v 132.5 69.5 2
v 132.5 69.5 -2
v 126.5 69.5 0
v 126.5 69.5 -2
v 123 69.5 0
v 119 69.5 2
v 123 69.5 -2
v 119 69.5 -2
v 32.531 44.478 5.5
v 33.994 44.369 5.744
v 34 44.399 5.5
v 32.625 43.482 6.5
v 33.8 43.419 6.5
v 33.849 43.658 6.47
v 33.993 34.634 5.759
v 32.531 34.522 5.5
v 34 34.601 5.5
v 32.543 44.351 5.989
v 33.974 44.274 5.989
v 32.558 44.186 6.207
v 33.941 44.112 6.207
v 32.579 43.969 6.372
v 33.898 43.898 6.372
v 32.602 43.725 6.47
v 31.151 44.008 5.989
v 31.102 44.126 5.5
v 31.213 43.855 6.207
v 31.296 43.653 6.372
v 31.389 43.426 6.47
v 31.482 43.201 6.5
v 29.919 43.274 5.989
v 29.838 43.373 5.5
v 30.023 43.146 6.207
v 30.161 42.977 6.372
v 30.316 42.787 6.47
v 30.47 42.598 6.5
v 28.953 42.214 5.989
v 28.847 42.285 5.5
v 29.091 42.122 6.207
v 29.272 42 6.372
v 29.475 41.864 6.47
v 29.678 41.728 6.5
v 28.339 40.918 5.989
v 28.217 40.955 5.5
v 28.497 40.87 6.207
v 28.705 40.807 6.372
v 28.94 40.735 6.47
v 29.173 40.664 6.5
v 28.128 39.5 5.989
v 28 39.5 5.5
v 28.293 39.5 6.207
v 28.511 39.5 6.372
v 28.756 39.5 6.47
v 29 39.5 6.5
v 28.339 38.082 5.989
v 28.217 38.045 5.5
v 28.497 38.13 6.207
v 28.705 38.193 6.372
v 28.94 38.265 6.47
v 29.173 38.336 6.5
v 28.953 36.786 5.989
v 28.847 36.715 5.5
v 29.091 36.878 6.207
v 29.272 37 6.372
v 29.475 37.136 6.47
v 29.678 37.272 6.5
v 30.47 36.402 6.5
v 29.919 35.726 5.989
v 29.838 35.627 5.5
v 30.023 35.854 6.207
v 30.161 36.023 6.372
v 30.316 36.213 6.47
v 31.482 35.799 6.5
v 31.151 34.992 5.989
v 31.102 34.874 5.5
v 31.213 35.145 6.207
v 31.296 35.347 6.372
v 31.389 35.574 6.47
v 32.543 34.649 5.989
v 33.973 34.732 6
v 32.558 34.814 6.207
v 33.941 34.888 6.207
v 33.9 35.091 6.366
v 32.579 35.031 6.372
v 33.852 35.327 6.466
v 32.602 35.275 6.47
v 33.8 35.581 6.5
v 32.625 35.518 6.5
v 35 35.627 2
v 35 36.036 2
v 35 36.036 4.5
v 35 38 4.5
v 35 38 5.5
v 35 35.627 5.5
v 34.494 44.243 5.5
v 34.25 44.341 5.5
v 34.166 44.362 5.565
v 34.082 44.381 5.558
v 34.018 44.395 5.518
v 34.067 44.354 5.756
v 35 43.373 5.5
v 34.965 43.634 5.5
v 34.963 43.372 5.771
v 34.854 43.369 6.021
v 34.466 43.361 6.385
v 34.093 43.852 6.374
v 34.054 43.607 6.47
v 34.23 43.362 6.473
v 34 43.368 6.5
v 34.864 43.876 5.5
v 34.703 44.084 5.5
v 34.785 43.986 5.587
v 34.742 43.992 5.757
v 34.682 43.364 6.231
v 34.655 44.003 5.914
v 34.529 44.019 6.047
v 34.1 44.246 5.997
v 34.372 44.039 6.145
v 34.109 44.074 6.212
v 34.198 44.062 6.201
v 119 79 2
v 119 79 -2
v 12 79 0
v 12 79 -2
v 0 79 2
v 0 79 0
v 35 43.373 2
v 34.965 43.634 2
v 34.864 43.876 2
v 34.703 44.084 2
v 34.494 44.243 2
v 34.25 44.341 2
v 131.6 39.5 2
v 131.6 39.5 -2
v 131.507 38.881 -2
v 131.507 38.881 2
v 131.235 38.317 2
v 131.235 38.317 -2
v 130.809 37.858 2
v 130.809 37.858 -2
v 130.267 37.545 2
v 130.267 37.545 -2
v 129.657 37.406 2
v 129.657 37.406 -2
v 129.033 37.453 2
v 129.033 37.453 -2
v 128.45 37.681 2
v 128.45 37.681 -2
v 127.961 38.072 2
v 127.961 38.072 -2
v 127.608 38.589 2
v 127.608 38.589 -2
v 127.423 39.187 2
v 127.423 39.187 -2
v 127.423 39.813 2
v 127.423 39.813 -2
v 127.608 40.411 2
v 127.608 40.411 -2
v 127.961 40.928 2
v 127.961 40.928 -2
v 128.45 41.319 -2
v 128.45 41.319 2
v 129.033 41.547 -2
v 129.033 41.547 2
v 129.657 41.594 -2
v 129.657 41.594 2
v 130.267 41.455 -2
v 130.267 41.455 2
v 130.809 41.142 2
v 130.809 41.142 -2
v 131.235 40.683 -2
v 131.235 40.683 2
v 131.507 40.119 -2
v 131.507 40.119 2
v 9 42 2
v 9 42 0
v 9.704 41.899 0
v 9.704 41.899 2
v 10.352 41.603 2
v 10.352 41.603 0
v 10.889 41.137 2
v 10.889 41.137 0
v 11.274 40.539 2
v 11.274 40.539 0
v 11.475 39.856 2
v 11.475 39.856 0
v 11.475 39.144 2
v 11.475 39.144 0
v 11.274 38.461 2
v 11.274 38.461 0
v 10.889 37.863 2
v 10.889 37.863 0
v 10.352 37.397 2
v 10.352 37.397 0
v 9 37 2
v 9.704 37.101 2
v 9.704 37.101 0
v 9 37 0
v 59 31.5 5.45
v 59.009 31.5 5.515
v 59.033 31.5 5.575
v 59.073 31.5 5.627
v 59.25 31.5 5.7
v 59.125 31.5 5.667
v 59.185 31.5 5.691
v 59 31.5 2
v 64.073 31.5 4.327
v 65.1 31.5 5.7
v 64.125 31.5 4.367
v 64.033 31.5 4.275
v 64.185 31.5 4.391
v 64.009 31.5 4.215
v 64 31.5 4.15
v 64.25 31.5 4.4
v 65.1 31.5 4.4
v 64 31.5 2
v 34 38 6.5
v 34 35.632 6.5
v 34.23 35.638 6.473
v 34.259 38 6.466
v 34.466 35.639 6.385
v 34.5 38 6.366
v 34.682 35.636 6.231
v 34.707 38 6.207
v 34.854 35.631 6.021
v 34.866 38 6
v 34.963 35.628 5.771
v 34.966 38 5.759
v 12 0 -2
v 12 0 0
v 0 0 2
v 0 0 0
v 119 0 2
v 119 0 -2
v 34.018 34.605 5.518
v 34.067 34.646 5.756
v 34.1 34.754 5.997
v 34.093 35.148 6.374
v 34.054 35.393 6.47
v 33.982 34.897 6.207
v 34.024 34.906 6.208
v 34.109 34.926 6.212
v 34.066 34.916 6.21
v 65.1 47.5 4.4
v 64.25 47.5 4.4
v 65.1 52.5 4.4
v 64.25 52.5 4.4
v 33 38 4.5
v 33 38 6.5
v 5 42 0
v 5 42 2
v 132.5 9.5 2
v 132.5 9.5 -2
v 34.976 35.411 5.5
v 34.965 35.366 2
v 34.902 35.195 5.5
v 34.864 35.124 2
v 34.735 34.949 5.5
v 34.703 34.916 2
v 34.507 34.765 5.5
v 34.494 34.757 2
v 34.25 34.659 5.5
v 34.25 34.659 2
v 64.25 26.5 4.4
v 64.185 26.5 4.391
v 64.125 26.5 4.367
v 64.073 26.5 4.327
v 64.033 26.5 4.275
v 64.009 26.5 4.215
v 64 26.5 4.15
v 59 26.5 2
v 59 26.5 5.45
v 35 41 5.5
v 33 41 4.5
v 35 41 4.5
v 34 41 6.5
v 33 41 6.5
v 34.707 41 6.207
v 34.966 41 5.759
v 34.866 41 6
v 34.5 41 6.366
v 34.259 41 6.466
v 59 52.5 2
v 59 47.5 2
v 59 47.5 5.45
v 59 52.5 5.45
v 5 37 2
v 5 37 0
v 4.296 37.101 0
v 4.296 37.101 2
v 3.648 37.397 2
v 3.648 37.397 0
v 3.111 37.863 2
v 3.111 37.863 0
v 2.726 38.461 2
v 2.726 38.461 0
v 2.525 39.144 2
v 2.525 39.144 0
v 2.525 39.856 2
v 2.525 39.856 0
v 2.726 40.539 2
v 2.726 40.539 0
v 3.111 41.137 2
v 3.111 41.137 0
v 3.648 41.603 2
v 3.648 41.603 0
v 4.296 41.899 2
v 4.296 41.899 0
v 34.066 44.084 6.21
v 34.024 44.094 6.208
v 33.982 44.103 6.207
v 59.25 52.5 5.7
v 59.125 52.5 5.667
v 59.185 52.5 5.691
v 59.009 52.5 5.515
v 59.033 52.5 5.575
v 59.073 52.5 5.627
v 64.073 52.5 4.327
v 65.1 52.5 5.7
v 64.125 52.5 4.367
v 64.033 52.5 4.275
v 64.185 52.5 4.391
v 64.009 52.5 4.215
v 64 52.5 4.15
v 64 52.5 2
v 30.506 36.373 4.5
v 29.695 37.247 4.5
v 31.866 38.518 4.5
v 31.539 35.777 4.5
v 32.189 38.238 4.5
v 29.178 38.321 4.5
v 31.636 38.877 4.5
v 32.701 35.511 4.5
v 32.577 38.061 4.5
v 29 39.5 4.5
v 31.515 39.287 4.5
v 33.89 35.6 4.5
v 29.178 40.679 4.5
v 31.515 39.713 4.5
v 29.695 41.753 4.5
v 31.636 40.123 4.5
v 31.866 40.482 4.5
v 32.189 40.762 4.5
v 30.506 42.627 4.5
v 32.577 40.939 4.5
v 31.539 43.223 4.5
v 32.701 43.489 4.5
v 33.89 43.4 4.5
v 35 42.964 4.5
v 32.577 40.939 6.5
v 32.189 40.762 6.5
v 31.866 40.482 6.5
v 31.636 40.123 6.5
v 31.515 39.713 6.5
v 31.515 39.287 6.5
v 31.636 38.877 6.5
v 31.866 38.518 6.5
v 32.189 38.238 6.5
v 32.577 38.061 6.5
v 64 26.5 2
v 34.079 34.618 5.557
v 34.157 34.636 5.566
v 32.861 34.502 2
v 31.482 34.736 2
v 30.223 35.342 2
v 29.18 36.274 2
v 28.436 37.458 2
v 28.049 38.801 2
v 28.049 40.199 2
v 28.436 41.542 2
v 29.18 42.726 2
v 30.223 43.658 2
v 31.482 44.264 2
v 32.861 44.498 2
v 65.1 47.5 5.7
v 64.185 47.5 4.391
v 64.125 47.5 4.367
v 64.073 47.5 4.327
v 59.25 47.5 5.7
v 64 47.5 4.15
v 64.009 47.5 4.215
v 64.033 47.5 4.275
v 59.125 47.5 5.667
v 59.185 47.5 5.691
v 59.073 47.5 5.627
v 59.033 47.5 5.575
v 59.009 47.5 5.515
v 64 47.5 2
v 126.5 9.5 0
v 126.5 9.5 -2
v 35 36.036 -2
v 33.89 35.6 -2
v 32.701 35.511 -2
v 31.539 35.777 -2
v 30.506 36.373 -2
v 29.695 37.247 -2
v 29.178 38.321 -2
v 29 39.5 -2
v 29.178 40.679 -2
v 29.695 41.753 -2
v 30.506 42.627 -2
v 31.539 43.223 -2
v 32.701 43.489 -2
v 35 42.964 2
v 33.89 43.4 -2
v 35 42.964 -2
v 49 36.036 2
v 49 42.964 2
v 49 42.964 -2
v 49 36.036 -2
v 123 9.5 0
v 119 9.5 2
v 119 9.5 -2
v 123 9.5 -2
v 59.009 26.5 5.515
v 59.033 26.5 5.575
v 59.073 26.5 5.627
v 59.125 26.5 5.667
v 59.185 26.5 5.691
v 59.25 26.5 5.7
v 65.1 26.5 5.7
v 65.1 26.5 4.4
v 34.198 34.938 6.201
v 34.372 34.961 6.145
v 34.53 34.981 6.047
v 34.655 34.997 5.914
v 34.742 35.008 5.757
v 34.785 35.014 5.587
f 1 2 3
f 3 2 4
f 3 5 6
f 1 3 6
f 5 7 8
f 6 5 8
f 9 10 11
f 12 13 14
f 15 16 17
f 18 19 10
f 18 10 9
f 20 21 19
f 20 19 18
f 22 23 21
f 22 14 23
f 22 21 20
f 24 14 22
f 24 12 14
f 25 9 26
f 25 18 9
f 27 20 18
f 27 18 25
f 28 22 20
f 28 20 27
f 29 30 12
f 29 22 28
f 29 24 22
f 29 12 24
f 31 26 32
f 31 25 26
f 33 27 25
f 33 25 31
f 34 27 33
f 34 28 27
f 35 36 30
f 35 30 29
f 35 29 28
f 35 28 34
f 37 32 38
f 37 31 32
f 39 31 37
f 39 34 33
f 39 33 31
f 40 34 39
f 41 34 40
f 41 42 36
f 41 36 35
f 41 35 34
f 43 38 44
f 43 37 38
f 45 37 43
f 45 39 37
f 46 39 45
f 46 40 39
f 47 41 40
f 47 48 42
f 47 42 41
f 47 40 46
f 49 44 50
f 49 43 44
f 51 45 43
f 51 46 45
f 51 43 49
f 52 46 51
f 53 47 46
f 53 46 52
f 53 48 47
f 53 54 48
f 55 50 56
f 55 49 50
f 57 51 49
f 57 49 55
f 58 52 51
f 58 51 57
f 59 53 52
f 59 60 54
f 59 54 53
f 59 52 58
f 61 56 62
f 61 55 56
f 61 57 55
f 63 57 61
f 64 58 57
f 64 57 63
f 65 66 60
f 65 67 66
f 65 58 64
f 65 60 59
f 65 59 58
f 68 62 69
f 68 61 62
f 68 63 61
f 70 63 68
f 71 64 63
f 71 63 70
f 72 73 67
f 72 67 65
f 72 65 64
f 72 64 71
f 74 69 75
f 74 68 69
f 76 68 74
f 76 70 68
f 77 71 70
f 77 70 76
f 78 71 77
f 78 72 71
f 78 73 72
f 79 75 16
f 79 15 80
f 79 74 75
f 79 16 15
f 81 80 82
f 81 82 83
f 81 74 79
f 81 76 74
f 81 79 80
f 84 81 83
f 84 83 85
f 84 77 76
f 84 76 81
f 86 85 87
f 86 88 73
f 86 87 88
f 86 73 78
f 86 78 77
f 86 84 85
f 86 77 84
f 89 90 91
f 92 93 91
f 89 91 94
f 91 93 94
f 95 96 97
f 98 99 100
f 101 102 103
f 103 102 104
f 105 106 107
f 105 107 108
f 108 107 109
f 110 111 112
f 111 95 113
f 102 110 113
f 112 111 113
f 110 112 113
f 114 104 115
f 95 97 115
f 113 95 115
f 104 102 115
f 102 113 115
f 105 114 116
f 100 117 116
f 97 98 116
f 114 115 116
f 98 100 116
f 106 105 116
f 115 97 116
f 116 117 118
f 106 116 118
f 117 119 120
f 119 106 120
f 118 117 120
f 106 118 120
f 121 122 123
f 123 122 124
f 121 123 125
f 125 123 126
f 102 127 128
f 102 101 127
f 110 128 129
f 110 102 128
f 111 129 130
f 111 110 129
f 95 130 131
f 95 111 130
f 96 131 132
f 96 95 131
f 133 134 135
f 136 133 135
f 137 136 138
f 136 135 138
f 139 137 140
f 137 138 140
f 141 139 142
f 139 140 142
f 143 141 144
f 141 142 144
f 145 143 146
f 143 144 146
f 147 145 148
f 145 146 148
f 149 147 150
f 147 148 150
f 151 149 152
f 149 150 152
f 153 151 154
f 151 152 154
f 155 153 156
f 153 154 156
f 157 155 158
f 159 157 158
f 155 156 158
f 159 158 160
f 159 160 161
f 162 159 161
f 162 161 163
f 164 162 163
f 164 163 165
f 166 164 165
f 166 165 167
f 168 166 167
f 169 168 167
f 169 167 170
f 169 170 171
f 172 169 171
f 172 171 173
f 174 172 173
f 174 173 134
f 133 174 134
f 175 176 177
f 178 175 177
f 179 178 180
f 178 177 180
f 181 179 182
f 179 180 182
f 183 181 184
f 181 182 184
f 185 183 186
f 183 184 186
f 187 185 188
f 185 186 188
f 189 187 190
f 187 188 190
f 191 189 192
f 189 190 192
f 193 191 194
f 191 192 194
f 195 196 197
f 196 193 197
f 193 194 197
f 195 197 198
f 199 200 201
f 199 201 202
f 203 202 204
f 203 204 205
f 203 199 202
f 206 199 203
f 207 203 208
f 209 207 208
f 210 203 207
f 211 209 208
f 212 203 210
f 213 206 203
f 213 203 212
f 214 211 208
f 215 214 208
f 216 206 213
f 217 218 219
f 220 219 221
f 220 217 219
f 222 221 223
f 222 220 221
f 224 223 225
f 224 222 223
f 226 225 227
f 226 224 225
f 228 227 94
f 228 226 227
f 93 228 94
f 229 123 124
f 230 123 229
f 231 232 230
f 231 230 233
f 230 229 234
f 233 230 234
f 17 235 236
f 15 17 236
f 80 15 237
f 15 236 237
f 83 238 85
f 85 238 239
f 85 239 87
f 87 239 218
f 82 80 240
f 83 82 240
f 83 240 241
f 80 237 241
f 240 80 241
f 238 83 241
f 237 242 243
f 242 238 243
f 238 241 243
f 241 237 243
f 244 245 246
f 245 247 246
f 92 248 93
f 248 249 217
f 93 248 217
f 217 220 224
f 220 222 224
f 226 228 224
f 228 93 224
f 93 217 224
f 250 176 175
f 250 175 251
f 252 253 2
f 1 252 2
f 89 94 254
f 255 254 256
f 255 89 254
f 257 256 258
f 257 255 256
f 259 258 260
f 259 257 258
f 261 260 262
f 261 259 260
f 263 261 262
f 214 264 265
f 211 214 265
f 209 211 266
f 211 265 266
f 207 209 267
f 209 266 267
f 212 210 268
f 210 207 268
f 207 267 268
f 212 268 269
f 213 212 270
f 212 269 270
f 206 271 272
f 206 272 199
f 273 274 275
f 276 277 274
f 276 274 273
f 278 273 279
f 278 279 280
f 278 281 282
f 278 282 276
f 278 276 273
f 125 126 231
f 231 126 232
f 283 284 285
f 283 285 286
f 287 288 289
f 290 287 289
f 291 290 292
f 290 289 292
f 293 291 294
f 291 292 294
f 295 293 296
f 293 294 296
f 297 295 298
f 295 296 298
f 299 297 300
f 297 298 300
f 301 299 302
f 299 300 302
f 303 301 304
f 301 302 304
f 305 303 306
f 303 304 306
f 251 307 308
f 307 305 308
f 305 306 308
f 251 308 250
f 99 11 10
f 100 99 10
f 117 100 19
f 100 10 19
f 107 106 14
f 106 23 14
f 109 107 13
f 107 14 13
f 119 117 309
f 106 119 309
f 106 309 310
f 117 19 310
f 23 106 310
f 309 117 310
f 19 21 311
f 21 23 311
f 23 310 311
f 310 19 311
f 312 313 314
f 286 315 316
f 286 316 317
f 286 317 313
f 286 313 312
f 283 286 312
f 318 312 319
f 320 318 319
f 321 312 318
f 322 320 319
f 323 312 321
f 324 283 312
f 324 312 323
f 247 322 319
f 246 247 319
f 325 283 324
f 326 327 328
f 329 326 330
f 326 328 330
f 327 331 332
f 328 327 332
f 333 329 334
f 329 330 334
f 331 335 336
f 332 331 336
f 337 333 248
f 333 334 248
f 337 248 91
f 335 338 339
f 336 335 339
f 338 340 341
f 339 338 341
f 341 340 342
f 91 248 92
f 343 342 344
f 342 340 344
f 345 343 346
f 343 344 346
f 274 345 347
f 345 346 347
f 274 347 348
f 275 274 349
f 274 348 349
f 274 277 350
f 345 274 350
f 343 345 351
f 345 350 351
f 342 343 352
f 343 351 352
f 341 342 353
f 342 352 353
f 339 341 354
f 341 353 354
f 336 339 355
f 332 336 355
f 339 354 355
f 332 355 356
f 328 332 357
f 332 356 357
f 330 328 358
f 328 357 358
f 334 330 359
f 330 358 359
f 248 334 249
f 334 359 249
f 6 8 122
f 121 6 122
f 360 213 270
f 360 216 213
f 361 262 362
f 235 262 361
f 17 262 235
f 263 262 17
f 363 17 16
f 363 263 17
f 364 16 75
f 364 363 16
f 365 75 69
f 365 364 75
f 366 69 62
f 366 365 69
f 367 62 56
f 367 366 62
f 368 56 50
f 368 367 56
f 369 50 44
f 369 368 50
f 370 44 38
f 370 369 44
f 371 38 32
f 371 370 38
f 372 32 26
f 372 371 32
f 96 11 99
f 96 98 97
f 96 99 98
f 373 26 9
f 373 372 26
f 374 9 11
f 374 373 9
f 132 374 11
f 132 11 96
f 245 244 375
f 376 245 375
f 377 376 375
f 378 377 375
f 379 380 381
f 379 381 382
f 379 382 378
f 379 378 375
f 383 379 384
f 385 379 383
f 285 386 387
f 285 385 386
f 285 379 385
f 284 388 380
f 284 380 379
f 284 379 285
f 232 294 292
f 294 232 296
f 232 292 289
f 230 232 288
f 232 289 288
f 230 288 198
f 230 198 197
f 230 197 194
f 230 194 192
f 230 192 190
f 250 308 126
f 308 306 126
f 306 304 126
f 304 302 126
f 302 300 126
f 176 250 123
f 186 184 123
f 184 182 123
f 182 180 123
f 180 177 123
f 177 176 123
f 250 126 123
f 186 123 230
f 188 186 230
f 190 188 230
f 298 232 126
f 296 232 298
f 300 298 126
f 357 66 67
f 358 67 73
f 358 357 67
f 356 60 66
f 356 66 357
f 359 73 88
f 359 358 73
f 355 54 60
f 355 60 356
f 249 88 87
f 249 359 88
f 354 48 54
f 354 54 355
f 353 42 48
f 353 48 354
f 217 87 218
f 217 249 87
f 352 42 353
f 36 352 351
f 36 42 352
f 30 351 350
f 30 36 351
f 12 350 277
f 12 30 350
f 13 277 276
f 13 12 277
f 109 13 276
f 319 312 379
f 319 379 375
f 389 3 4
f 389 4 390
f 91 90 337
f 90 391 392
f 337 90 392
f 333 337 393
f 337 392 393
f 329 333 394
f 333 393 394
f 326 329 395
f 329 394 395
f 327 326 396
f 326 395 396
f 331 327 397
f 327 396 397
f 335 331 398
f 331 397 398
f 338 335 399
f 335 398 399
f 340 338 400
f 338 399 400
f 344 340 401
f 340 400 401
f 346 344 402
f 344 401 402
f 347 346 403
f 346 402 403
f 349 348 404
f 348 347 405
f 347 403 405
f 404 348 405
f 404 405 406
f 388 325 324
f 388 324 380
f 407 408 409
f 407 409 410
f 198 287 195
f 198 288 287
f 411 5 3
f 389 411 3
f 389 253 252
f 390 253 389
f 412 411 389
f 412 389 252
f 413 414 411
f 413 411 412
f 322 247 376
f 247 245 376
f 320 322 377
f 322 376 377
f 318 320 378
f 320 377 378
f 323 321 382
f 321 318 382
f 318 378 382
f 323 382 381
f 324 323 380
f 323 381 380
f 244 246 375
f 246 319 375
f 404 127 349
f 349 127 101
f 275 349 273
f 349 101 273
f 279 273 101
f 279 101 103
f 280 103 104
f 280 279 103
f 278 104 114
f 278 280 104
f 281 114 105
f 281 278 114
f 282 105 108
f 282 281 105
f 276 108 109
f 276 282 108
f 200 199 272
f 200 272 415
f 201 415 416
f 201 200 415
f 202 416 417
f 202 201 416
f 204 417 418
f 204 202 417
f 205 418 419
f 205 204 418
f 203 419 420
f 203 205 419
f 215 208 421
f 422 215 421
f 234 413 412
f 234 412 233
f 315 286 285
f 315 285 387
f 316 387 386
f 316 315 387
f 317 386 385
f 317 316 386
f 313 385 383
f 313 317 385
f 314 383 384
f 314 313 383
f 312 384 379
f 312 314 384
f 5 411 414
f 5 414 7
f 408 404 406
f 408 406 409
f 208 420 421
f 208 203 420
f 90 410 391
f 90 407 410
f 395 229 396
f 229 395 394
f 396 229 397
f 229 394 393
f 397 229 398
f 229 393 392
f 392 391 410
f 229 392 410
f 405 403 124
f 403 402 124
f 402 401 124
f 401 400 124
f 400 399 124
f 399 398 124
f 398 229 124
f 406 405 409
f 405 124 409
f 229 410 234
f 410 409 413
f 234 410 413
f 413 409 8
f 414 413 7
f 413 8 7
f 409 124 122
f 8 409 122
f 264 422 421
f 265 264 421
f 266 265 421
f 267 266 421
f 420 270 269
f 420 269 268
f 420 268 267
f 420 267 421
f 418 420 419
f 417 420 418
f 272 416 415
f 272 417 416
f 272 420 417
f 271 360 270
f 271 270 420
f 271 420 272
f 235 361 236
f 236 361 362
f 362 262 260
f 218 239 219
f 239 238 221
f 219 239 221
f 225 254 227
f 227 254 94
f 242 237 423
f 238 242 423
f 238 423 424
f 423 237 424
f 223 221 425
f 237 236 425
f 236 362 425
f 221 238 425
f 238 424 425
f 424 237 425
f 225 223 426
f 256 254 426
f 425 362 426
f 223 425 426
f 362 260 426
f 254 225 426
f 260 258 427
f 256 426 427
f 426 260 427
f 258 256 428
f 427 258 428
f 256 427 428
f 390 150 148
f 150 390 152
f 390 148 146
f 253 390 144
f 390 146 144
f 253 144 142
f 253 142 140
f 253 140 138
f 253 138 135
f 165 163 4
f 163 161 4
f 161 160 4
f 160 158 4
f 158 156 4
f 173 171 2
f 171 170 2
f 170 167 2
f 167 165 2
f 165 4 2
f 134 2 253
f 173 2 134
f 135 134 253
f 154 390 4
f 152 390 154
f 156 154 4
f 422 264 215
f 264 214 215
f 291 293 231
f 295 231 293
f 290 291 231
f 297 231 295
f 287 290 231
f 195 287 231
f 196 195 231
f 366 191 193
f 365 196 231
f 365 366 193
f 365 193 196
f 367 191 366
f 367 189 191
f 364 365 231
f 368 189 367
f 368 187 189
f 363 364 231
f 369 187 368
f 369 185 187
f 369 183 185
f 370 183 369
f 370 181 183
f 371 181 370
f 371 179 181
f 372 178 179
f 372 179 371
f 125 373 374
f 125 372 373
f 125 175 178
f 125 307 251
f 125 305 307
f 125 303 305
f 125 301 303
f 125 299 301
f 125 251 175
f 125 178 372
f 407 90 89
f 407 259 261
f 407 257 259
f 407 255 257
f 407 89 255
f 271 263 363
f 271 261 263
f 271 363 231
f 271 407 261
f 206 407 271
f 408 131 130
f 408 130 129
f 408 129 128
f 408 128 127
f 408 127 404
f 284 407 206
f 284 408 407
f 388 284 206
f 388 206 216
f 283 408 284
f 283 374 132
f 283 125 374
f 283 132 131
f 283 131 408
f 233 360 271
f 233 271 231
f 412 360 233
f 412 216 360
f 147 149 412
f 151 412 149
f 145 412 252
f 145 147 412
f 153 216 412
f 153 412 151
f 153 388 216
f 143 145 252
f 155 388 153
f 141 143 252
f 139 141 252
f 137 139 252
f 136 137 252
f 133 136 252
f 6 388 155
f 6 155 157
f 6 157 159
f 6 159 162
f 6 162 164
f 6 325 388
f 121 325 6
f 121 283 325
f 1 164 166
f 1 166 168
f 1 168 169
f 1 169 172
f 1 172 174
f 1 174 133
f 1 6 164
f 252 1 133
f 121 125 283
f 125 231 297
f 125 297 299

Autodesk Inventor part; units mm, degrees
ref_plane "YZ Plane" through (0, 0, 0) normal (1, 0, 0) x (0, 1, 0)
ref_plane "XZ Plane" through (0, 0, 0) normal (0, 1, 0) x (-1, 0, 0)
ref_plane "XY Plane" through (0, 0, 0) normal (0, 0, 1) x (1, 0, 0)
sketch "Sketch1" plane through (0, 0, 0) normal (0, 0, 1) x (1, 0, 0)
  line L0 (0, 0) -> (123, 0)
  line L1 (123, 0) -> (123, 79)
  line L2 (123, 79) -> (0, 79)
  line L3 (0, 79) -> (0, 0)
  line L4 (12, 79) -> (12, 0)
  line L5 (123, 69.5) -> (126.5, 69.5)
  line L6 (126.5, 69.5) -> (126.5, 9.5)
  line L7 (126.5, 9.5) -> (123, 9.5)
  line L8 (123, 9.5) -> (123, 69.5)
  line L9 (126.5, 9.5) -> (132.5, 9.5)
  line L10 (132.5, 9.5) -> (132.5, 69.5)
  line L11 (132.5, 69.5) -> (126.5, 69.5)
  line L12 (126.5, 69.5) -> (126.5, 9.5)
  line L13 (123, 69.5) -> (119, 69.5)
  line L14 (119, 69.5) -> (119, 79)
  line L15 (119, 79) -> (123, 79)
  line L16 (123, 79) -> (123, 69.5)
  line L17 (123, 9.5) -> (119, 9.5)
  line L18 (119, 9.5) -> (119, 0)
  line L19 (119, 0) -> (123, 0)
  line L20 (123, 0) -> (123, 9.5)
  circle A0 centre (129.5, 39.5) radius 2.1
  line L21 (9, 39.5) -> (5, 39.5) construction
  line L22 (9, 42) -> (5, 42)
  line L23 (5, 37) -> (9, 37)
  arc A1 (9, 37) -> (9, 42) centre (9, 39.5) ccw
  arc A2 (5, 42) -> (5, 37) centre (5, 39.5) ccw
  point P0 (7, 39.5)
  dimension "d0" = 123
  dimension "d1" = 79
  dimension "d2" = 111
  dimension "d3" = 3.5
  dimension "d4" = 6
  dimension "d5" = 60
  dimension "d6" = 9.5
  dimension "d7" = 4
  dimension "d8" = 4
  dimension "d9" = 4.2
  dimension "d10" = 3
  dimension "d11" = 30
  dimension "d20" = 5
  dimension "d21" = 3
  dimension "d22" = 4
  dimension "d23" = 39.5
extrude "Extrusion1" add sketch "Sketch1" along normal blind 2 contours L3 L2 L4 L0 | L4 L2 L14 L13 L1 L17 L18 L0 | L1 L5 L6 L7 | L6 L11 L10 L9 | A0
extrude "Extrusion3" add sketch "Sketch1" against normal blind 2 contours L4 L2 L14 L13 L1 L17 L18 L0 | L6 L11 L10 L9
sketch "Sketch2" plane through (0, 0, 2) normal (0, 0, 1) x (1, 0, 0)
  circle A0 centre (60, 39.5) radius 34
  line L0 (119, 79) -> (0, 79) projected
  line L1 (0, 79) -> (0, 0) projected
  line L2 (59, 52.5) -> (64, 52.5)
  line L3 (64, 52.5) -> (64, 47.5)
  line L4 (64, 47.5) -> (59, 47.5)
  line L5 (59, 47.5) -> (59, 52.5)
  line L6 (59, 31.5) -> (64, 31.5)
  line L7 (64, 31.5) -> (64, 26.5)
  line L8 (64, 26.5) -> (59, 26.5)
  line L9 (59, 26.5) -> (59, 31.5)
  circle A1 centre (33, 39.5) radius 1.5
  circle A2 centre (33, 39.5) radius 4
  line L10 (35, 42.9641) -> (35, 36.0359)
  line L11 (33, 41) -> (35, 41)
  line L12 (33, 38) -> (35, 38)
  circle A3 centre (33, 39.5) radius 5
  line L13 (35, 42.9641) -> (35, 44.0826)
  line L14 (35, 36.0359) -> (35, 34.9174)
  line L15 (35, 42.9641) -> (49, 42.9641)
  line L16 (49, 42.9641) -> (49, 36.0359)
  line L17 (49, 36.0359) -> (35, 36.0359)
  line L18 (35, 36.0359) -> (35, 42.9641)
  dimension "d24" = 68
  dimension "d25" = 39.5
  dimension "d26" = 60
  dimension "d27" = 16
  dimension "d28" = 5
  dimension "d29" = 5
  dimension "d30" = 8
  dimension "d31" = 5
  dimension "d32" = 31
  dimension "d33" = 27
  dimension "d34" = 3
  dimension "d35" = 8
  dimension "d36" = 64
  dimension "d37" = 2
  dimension "d38" = 10
  dimension "d51" = 16
  dimension "d52" = 6.9282
extrude "Extrusion4" add sketch "Sketch2" along normal blind 3.7 contours L2 L3 L4 L5 | L6 L7 L8 L9
sketch "Sketch3" plane through (0, 0, 5.7) normal (0, 0, 1) x (1, 0, 0)
  line L0 (59, 52.5) -> (64, 52.5) projected
  line L1 (59, 52.5) -> (65.1, 52.5)
  line L2 (65.1, 52.5) -> (65.1, 47.5)
  line L3 (65.1, 47.5) -> (59, 47.5)
  line L4 (59, 47.5) -> (59, 52.5)
  line L5 (59, 47.5) -> (64, 47.5) projected
  line L6 (59, 31.5) -> (64, 31.5) projected
  line L7 (59, 31.5) -> (65.1, 31.5)
  line L8 (65.1, 31.5) -> (65.1, 26.5)
  line L9 (65.1, 26.5) -> (59, 26.5)
  line L10 (59, 26.5) -> (59, 31.5)
  line L11 (59, 26.5) -> (64, 26.5) projected
  line L12 (64, 47.5) -> (64, 52.5) projected
  line L13 (64, 26.5) -> (64, 31.5) projected
  point P0 (0, 0)
  point P1 (61.5, 47.5)
  point P2 (61.5, 26.5)
  dimension "d41" = 1.1
  dimension "d42" = 1.1
extrude "Extrusion5" add sketch "Sketch3" against normal blind 1.3
fillet "Fillet1" radius 0.25 4 edges at (59, 29, 5.7) (59, 50, 5.7) (64, 29, 4.4) (64, 50, 4.4)
extrude "Extrusion6" add sketch "Sketch2" along normal blind 4.5 contours A2 L14 A3 L13
sketch "Sketch4" plane through (0, 0, 6.5) normal (0, 0, 1) x (1, 0, 0)
  line L0 (35, 42.9641) -> (35, 36.0359) projected
  line L1 (33, 41) -> (35, 41) projected
  circle A0 centre (33, 39.5) radius 1.5 projected
  line L2 (33, 38) -> (35, 38) projected
  arc A1 (35, 42.9641) -> (35, 36.0359) centre (33, 39.5) ccw projected
  point P0 (0, 0)
extrude "Extrusion7" add sketch "Sketch4" against normal blind 2 contours L0 L1 A0 L2 A1
fillet "Fillet2" radius 1 2 edges at (35, 36.4587, 6.5) (35, 42.5413, 6.5)
extrude "Extrusion8" cut sketch "Sketch2" against normal through all contours A1 | A1 L11 L10 L12 | A1 L12 L10 A2 L11 | L10 A2 | L15 A3 L17 A2 | L15 L16 L17 A3
fillet "Fillet3" radius 1 5 edges at (34.7352, 34.8107, 6.1779) (35, 34.9174, 3.75) (34.7352, 44.1893, 6.1779) (35, 44.0826, 3.75) (28, 39.5, 6.5)
sketch "Sketch5" plane through (0, 0, 2) normal (0, 0, 1) x (1, 0, 0)
  point P0 (0, 0)
extrude "Extrusion9" cut sketch "Sketch1" along normal through all both and the other way through all contours A0
equation "\"d6\" = -0.5 * d5 + 0.5 * d1"
equation "\"d10\" = 0.5 * d4"
equation "\"d11\" = 0.5 * d5"
equation "\"d23\" = 0.5 * d1"
equation "\"d25\" = d23"
equation "\"d29\" = d28"
equation "\"d30\" = 0.5 * d27"
properties part number "gps_cover"
